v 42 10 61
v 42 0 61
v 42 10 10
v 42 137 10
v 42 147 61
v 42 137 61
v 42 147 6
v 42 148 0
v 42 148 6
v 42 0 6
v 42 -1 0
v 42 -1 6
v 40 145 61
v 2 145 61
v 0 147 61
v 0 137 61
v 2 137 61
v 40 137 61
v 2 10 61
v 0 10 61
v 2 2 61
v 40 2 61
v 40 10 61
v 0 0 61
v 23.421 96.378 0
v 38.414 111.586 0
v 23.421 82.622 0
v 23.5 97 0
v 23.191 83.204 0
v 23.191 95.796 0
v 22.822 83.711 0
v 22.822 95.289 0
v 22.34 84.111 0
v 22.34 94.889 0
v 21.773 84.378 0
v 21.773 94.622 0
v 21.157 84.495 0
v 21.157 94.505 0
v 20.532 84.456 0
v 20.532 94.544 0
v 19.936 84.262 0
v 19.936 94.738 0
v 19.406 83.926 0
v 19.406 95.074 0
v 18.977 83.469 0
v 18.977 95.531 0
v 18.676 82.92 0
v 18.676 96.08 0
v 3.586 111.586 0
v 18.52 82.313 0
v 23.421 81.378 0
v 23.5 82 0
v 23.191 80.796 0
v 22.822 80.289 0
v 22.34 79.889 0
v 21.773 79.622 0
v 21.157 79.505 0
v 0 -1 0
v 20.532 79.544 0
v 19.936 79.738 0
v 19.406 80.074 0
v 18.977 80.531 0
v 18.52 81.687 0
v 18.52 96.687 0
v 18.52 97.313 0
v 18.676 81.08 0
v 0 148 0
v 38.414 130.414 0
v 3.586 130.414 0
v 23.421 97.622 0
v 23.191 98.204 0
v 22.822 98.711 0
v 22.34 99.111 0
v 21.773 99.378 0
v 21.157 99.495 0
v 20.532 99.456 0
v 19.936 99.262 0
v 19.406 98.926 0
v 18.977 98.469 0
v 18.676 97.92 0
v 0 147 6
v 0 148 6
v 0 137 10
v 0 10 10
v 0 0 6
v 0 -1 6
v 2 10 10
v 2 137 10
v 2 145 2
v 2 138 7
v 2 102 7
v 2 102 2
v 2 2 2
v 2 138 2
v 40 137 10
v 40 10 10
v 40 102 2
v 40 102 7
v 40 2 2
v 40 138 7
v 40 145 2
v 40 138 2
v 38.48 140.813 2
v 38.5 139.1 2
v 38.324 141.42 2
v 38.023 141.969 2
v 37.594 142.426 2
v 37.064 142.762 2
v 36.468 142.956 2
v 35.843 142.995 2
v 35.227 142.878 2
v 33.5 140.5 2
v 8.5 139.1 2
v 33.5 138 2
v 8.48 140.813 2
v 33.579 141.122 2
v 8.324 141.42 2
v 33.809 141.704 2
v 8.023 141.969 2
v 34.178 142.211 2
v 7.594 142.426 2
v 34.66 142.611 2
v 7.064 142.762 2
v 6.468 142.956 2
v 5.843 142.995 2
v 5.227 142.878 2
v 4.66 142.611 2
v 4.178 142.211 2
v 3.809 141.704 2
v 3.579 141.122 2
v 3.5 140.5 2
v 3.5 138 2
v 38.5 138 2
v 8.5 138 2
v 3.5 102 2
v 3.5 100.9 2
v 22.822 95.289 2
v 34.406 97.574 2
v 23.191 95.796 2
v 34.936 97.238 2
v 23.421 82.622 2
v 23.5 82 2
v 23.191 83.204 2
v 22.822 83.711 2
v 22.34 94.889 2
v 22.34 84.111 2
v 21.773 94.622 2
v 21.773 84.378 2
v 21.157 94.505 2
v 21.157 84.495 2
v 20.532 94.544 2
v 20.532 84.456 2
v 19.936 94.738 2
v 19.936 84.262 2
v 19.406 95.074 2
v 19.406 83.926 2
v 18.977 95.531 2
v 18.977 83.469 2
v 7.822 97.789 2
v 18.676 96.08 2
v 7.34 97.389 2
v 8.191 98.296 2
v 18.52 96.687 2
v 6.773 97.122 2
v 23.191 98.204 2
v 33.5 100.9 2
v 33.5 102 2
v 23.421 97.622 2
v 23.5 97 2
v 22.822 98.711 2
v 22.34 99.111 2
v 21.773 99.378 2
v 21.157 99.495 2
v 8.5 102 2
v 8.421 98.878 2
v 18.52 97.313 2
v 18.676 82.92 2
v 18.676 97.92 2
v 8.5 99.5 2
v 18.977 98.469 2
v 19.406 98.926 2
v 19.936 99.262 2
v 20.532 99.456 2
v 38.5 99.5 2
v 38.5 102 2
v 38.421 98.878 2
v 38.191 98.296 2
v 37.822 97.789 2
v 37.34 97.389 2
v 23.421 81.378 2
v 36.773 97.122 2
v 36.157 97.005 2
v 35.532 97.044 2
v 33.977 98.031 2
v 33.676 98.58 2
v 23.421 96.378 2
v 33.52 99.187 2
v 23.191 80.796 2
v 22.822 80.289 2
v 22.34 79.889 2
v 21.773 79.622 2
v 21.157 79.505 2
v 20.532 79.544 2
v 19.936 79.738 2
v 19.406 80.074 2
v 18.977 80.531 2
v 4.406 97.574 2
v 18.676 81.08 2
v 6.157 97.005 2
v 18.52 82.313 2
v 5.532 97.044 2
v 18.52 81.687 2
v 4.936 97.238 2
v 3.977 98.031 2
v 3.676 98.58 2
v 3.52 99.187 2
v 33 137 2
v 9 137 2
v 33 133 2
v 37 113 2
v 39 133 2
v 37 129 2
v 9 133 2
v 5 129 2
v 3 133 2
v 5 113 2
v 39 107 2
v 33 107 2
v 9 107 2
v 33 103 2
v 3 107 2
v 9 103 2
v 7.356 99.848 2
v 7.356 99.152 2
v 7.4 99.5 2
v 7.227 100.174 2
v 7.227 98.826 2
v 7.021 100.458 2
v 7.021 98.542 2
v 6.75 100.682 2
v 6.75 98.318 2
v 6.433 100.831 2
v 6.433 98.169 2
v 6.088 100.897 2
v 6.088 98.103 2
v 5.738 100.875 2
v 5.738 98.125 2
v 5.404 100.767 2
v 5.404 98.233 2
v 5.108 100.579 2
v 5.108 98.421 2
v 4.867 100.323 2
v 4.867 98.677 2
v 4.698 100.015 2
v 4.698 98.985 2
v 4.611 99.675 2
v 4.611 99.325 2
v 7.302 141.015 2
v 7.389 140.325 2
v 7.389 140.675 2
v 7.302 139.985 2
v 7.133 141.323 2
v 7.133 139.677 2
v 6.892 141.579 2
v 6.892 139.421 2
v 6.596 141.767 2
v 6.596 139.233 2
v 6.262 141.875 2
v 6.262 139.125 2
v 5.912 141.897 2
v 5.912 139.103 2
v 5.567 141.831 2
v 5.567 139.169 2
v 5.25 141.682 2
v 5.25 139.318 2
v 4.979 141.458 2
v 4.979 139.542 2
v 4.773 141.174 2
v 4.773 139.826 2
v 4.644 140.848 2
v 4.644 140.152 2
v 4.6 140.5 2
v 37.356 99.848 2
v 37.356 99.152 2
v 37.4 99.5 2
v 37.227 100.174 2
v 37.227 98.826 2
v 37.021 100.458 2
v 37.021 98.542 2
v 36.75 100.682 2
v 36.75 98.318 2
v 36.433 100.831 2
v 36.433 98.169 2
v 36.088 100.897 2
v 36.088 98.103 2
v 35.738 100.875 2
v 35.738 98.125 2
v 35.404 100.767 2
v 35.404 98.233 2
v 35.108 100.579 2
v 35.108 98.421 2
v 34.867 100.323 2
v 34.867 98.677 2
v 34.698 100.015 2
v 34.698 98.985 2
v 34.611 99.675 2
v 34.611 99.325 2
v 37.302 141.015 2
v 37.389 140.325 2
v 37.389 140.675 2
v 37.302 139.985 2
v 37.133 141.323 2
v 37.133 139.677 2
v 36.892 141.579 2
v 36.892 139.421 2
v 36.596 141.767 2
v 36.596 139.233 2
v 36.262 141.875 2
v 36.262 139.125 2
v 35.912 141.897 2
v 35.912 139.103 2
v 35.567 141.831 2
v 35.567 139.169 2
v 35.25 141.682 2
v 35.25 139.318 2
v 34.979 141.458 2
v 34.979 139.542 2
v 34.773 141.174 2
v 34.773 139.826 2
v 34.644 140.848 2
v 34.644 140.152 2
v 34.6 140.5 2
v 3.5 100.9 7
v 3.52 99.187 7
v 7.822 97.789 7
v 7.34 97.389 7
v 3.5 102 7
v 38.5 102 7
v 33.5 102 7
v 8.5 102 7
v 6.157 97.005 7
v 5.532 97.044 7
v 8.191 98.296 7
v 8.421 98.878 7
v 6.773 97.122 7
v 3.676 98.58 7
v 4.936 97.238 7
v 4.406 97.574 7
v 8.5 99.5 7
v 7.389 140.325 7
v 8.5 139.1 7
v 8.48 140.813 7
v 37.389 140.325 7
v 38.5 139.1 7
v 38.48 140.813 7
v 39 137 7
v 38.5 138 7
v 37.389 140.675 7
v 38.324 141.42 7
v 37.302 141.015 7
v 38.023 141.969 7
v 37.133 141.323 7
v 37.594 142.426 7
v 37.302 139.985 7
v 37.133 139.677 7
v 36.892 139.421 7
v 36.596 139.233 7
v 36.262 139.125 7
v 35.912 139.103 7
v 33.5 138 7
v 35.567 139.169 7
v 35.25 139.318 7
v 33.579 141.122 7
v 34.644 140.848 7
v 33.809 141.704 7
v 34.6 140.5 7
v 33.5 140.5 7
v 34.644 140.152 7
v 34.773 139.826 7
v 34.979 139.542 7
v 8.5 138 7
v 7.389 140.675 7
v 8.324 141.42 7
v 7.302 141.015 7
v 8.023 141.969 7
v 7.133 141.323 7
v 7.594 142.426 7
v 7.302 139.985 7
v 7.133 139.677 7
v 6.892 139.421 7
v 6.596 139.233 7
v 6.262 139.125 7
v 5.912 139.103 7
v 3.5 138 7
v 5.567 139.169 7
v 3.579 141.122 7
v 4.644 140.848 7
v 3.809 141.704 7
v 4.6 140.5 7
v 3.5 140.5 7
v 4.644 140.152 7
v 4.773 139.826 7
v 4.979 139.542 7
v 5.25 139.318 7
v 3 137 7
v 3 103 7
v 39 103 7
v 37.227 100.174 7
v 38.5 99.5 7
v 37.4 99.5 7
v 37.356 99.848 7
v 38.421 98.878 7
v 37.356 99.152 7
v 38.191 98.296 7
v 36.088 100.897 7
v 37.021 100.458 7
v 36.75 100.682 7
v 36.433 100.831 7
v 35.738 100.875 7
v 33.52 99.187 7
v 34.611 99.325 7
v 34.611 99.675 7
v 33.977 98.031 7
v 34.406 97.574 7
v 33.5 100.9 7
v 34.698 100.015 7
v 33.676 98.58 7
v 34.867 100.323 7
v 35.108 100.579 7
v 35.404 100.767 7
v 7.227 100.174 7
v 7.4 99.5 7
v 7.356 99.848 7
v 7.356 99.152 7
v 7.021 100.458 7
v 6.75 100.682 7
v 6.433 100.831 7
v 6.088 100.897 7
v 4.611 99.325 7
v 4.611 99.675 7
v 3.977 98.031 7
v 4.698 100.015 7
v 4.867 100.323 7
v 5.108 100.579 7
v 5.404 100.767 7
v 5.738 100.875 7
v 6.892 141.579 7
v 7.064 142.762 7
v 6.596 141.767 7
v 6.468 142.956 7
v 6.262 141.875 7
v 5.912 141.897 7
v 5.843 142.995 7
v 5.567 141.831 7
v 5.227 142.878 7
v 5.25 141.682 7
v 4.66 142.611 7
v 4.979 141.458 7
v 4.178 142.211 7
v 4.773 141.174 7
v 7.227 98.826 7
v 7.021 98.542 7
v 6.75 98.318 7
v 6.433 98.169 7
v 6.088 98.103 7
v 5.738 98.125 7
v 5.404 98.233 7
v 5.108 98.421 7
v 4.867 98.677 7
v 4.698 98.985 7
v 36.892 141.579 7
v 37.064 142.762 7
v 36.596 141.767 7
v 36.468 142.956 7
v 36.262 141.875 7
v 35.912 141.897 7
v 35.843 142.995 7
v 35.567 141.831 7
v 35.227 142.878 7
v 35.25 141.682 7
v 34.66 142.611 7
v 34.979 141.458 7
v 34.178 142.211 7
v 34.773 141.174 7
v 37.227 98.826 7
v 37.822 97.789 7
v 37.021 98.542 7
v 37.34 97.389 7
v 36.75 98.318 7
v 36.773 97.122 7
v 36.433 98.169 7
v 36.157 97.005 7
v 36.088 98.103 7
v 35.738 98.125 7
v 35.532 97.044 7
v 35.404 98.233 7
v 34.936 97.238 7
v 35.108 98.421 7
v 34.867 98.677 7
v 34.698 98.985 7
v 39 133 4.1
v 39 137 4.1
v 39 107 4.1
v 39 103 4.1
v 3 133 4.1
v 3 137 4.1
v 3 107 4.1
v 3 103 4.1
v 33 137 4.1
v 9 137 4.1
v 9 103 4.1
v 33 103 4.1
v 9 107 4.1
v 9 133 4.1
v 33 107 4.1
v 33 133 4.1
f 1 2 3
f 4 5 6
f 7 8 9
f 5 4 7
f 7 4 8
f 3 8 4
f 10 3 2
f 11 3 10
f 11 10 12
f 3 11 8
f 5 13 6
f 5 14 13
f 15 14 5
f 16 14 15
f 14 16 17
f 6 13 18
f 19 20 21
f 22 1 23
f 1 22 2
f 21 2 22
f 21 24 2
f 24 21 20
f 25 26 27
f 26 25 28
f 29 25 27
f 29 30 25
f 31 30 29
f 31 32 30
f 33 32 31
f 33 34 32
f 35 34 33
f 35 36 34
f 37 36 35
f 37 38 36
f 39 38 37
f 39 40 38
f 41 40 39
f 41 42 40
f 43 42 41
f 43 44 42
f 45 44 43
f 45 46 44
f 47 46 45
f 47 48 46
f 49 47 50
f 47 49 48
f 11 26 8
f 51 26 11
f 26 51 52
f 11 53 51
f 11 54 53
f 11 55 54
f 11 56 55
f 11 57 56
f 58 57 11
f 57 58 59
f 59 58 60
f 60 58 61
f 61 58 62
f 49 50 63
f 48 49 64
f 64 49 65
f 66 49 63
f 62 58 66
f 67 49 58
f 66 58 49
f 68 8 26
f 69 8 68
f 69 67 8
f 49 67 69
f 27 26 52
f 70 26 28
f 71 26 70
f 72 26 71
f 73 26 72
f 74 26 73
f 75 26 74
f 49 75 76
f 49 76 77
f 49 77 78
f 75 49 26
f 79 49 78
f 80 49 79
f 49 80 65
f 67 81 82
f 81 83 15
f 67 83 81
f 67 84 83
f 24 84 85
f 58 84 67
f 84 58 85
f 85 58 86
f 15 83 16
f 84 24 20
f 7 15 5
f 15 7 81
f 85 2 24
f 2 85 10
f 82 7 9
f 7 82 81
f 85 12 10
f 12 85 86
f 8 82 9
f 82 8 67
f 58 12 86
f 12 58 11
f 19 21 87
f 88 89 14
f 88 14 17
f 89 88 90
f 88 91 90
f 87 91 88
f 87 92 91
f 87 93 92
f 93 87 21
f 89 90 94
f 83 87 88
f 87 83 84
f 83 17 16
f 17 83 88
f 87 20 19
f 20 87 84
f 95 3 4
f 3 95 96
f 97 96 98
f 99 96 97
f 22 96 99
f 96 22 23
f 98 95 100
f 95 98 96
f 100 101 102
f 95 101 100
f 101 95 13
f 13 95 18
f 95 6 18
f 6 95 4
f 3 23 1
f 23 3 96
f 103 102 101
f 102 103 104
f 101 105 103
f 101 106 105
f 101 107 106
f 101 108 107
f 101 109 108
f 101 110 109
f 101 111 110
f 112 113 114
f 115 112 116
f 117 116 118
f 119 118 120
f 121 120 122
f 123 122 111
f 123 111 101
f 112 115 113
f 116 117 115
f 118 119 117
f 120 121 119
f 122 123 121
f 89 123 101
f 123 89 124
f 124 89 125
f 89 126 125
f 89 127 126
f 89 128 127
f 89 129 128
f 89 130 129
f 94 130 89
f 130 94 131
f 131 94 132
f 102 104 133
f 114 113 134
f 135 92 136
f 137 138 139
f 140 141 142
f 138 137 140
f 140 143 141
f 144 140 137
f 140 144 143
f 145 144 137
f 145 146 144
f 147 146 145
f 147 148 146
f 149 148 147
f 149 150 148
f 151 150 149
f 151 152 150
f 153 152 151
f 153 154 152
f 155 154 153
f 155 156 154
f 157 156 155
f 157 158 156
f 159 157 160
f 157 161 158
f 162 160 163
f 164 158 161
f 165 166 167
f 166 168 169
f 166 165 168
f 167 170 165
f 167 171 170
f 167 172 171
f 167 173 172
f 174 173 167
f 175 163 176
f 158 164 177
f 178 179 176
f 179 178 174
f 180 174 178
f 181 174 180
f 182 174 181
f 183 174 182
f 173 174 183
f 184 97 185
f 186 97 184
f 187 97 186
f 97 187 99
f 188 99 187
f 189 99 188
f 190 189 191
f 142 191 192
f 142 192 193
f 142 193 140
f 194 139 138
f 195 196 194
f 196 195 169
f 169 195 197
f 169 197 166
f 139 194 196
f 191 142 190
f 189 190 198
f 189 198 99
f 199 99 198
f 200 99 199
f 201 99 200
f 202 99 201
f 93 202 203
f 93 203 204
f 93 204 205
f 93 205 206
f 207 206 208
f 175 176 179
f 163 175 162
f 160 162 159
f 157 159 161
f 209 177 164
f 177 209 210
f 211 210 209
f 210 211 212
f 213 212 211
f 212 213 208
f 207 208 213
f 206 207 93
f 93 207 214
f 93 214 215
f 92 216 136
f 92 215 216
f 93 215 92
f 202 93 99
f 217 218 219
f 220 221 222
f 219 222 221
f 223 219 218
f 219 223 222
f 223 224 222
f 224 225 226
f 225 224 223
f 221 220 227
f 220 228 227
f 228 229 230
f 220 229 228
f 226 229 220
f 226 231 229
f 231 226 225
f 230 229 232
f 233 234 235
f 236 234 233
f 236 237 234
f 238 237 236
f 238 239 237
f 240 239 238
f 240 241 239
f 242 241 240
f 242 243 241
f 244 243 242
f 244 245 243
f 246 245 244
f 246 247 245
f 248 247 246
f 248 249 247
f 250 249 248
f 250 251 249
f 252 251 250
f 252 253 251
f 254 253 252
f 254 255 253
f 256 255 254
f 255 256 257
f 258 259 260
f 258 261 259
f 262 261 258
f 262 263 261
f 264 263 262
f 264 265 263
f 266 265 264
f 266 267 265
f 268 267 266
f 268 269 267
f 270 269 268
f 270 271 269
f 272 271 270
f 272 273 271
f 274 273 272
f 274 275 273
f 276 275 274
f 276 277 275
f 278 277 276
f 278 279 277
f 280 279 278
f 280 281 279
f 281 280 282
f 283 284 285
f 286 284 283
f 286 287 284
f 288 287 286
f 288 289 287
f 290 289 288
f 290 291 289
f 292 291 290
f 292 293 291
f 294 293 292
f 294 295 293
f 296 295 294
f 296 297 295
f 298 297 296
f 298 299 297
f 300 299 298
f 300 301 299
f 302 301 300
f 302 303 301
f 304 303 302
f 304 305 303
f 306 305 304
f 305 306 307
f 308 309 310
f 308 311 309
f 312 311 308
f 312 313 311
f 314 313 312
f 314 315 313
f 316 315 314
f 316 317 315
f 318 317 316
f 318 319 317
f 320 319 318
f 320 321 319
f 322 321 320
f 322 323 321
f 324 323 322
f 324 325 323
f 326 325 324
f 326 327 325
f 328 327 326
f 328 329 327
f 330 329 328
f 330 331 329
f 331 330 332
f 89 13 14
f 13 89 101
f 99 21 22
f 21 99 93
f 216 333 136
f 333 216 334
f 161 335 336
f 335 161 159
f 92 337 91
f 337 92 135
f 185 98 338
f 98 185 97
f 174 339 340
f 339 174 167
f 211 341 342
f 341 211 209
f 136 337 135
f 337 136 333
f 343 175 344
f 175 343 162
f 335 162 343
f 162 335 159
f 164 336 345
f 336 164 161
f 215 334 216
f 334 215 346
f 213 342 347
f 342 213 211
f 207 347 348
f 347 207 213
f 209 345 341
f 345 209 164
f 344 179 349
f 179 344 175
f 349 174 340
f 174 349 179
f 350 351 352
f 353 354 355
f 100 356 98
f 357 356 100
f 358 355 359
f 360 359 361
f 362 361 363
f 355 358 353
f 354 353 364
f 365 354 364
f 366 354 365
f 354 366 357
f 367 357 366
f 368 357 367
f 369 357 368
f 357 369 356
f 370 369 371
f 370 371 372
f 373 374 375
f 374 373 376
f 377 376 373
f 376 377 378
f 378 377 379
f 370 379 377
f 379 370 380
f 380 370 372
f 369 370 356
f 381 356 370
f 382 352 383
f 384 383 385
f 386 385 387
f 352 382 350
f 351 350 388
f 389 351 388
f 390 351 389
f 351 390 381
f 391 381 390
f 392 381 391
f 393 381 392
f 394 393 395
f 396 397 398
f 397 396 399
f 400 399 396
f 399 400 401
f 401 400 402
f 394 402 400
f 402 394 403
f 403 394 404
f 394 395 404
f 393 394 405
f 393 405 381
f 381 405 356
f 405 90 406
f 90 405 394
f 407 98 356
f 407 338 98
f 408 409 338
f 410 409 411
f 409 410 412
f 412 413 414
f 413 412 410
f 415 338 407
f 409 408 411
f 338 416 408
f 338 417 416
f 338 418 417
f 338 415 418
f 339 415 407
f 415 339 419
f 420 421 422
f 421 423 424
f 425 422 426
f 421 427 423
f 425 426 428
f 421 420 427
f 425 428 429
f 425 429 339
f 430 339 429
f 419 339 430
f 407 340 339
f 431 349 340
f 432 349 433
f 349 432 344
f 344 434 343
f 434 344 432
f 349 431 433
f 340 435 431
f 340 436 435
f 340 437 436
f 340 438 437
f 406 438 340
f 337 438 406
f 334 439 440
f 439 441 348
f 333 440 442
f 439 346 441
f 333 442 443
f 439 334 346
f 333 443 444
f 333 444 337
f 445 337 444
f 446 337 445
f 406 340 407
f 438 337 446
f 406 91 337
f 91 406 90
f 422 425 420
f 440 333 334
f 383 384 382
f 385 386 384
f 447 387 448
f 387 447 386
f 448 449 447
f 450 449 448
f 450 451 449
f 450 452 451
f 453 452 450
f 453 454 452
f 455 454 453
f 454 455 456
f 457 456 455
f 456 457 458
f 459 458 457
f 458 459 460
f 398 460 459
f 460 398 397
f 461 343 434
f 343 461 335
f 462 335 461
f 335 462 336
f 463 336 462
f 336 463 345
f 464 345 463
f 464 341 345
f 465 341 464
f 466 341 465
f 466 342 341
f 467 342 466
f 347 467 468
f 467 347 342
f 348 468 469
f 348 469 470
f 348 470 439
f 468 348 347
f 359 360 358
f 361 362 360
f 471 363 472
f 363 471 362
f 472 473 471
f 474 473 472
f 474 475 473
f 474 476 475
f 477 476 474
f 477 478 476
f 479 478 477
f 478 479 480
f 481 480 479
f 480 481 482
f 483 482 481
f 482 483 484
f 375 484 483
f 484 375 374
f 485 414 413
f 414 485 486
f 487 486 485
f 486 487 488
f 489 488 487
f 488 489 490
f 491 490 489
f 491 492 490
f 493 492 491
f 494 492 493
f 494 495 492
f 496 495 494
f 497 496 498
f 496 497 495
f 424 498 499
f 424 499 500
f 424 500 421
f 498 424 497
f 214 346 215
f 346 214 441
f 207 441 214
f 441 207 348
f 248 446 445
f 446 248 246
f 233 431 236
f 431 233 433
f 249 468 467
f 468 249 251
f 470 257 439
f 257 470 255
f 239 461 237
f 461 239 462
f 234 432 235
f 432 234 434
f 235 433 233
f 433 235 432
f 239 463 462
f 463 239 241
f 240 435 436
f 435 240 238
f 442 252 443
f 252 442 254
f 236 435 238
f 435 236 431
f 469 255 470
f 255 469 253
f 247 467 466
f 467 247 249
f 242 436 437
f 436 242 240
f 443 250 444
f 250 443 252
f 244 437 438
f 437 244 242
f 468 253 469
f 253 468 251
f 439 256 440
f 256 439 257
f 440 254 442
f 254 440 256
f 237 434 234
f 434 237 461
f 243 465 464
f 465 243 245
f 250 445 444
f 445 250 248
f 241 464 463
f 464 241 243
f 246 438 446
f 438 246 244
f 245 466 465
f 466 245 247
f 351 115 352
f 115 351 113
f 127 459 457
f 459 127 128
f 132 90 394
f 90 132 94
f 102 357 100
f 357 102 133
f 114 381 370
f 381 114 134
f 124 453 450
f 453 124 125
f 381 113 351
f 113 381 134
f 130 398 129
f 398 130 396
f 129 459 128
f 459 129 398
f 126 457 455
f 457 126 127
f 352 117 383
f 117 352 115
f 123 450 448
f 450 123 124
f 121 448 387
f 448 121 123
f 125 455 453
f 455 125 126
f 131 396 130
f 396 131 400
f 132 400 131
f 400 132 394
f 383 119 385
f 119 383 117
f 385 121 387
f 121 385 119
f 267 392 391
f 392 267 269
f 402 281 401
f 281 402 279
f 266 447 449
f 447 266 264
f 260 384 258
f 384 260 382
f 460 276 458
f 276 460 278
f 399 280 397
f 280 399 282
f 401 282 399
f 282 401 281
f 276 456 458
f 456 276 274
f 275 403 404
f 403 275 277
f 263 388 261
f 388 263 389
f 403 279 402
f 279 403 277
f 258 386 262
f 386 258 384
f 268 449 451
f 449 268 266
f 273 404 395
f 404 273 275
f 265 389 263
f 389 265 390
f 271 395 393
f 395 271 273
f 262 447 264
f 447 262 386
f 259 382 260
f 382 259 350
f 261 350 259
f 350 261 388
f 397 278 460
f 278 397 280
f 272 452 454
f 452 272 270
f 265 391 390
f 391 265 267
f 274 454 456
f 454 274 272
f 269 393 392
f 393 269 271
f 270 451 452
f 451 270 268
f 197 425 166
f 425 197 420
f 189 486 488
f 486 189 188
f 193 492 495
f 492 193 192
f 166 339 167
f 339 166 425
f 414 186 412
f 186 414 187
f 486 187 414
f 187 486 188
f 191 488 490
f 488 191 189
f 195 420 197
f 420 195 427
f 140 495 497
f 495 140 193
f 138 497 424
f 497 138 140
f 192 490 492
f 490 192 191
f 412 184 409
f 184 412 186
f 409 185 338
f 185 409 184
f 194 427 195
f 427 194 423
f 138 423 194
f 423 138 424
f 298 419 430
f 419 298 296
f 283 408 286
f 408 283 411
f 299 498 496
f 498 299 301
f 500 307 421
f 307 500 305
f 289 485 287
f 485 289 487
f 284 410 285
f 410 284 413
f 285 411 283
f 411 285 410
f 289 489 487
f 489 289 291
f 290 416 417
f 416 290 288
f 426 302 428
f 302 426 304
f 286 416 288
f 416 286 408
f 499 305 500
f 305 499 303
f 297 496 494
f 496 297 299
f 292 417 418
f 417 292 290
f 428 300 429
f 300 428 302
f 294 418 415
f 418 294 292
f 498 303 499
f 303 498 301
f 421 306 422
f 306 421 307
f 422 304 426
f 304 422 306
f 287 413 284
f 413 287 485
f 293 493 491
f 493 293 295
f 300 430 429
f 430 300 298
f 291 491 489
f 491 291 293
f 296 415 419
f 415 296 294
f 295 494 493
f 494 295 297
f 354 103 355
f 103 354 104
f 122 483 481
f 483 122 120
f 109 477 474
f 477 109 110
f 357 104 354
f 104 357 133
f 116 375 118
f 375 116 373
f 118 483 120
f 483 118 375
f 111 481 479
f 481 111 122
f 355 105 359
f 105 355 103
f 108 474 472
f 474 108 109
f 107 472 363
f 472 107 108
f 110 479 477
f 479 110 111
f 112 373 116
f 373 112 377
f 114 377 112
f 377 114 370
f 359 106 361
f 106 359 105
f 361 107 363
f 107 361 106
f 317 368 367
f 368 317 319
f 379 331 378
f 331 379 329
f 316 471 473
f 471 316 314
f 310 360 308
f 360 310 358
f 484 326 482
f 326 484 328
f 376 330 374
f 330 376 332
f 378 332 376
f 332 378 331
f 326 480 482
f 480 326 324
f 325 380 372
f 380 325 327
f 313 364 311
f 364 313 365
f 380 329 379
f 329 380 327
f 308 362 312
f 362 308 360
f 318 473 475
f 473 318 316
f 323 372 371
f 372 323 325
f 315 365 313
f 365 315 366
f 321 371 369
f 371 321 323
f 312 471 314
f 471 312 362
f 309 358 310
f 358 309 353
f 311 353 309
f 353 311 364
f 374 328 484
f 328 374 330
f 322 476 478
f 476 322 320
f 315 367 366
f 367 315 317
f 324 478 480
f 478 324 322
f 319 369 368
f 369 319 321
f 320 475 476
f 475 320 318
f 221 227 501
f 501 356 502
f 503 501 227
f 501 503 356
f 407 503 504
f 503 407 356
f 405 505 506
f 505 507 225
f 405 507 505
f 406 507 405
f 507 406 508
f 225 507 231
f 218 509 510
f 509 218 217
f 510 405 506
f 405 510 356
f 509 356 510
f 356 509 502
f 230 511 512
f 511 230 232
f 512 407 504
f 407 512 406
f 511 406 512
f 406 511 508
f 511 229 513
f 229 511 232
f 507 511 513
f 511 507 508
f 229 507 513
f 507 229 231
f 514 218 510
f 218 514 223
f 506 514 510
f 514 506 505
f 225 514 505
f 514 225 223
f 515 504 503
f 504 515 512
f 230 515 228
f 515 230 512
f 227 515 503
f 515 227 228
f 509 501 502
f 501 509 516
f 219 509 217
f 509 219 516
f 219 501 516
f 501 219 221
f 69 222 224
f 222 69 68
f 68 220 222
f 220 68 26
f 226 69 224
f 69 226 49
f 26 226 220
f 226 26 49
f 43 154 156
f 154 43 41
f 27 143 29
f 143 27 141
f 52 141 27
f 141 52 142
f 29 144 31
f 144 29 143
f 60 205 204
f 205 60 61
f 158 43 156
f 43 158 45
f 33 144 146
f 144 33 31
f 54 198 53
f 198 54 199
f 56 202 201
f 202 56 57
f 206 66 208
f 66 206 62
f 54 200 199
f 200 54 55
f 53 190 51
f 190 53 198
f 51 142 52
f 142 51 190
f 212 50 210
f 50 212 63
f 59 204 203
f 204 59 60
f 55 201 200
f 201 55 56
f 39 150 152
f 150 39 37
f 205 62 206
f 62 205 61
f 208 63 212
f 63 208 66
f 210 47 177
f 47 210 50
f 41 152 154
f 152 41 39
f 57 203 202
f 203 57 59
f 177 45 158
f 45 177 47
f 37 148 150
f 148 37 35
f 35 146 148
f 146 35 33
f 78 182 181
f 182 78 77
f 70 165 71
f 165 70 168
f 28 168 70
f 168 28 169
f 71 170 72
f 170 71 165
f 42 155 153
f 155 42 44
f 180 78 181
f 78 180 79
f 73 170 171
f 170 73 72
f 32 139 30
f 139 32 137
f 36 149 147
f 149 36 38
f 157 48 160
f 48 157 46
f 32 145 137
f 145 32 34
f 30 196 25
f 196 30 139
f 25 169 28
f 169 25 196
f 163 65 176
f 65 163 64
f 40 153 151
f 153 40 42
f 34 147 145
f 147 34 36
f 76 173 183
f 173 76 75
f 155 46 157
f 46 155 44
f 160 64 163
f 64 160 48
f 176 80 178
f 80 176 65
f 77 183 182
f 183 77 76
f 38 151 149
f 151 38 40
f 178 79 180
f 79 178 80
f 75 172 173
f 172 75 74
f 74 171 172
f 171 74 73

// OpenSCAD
// file: lib/traymount.scad
use <./shapes.scad>

module traymount(width, height, front_thickness, thickness, positive, ds=2.3) {

    tray_screw_mount_spacing = 10;
    tray_screw_mount_height = 5;
    tray_screw_mount_diameter = 8;

    // Allow tray components to get closer to the front by making an indentation
    indent_rim = 4;
    indent_width = width - (2*indent_rim);
    indent_height = height - (2*indent_rim);
    indent_depth = 2;
    indent_x = indent_rim;
    indent_y = indent_rim;

    botton_hole_offset = 15;
    botton_hole_spacing = 7;
    usb_hole_width = 7;
    usb_hole_height = 15;

    module __build() {

        // rbd = max(rotary_box_depth, thickness-rotary_thread_height);

        difference() {
            union() {
                // Make sure we using the front plate (allow cut cutting in it)
                cube([width, height, front_thickness]);
            }
            union() {
                // Provide an additional 1mm for stuff in the tray
                translate([indent_x, indent_y, front_thickness-indent_depth])
                    cube([indent_width, indent_height, indent_depth]);

                //
                for (hole=[0,1]) {
                    translate([width/2, botton_hole_offset + (hole * botton_hole_spacing)])
                        cylinder(r=3.5 / 2, h=front_thickness);
                }

                // USB
                translate([(width - usb_hole_width)/2, botton_hole_offset + (2 * botton_hole_spacing)])
                    cube([usb_hole_width, usb_hole_height, front_thickness]);

            }
        }

    }

    if (positive == true) {
        translate([0,0,-front_thickness])
            __build();
    } else {
        translate([0,0,0])
            difference() {
                hull() __build();
                __build();
            }
    }
}
// file: lib/shapes.scad
module flat_pyramid(size, angle=45) {  
    p = size.z * sin(angle);
    hull() {
        cube(size);
        translate([-p, -p, -size.z])
            cube([size.x+(2*p), size.y+(2*p), size.z]);
    }   
}

module screw_mount(h, dm, ds=2.3) {
    difference() {
        cylinder(h=h, r=dm/2);
        screw_hole(h=h, d=ds);
    }
}

module screw_mount_flatside(h, dm, ds=2.3) {
    difference() {
        hull() {
        cylinder(h=h, r=dm/2);
        translate([-(dm/2), ds/2, 0])
            cube([dm, (dm-ds)/2, h]);

        }
        screw_hole(h=h, d=ds);       
    }
}

module screw_hole(h=0, d=2.3) {
    cylinder(h=h, r=d/2);       
}

module quad_mount(x, y, h=0, dm=5, ds=2.3) {
    translate([0,0])
        screw_mount(h, dm, ds);
    translate([x,0])
        screw_mount(h, dm, ds);
    translate([0,y])
        screw_mount(h, dm, ds);
    translate([x,y])
        screw_mount(h, dm, ds);
}

module sunken_screw_hole(h, d=3, dh=6, hh=2) {
    // Hole straight through
    cylinder(r=d/2,h=h);
    // Edged hole:
    hull() {
        cylinder(r=dh/2,h=0.1);
        translate([0,0,hh]) cylinder(r=d/2,h=0.1);
    }
}
// file: lib/pushbutton.scad
module pushbutton_cutout(d0=5, d1=8, h0=2, h1=4) {
    cylinder(h=h0, r=(d0/2));

    translate([0,0,h0])
        cylinder(h=h1, r=(d1/2));
}
// file: lib/oled128x64-13.scad
use <shapes.scad>

inside = [
    36, 
    34,
    5
];
screw_mount_d = 5;

module __oled_128x64_13_mounts(size, t=1, d=3) {
    // Screw mounts
    for (x=[0,1])
    for (y=[0,1])           
    translate([
        (x * size.x) - (((x-0.5)*2) * 4),
        (y * size.y) + (((y-0.5)*2) * (screw_mount_d/2)),
    ])
    rotate( y*180 )
    screw_mount_flatside(h=size.z, dm = 5, ds=d);

    cube(size);
}

module __oled_128x64_13_pads(t) {
    pad = [6, 4, t];
    for (x=[0,1])
    for (y=[0,1])           
    translate([
        (x * inside.x) - (x * pad.x),
        (y * inside.y) - (y * pad.y),
    ])
    cube(pad);
}

module oled_128x64_13(positive, t=1, tfront=2, dh=3, ds=2.8, center=true) {

    outside = [
        inside.x + (2*t),
        inside.y + (2*t),
        inside.z
    ];

    view = [
        32,
        16,
        tfront
    ];
    view_offset_y = 10.0;

    // Relative to inside
    view_pos = [(inside.x-view.x)/2, view_offset_y];
    
    translate(center==true ? [-outside.x/2, -outside.y/2] : [0,0]) {

        // This is the "drop-in-hole" for the OLED display,
       
        if (positive==true) {

            difference() {
                __oled_128x64_13_mounts(outside, t=t, d=ds);
                translate([t,t])
                    cube(inside);
            }

            translate([t,t])
                __oled_128x64_13_pads(2.1);
        } else {
            translate([t,t,-tfront]) {
                translate(view_pos)
                flat_pyramid(view);
            }
        }
    }
}

module oled_128x64_13_support(positive, t=1, tlid=2, dh=3, dh=3.1) {

    lid = [
        inside.x + (2*t),
        inside.y + (2*t),
        tlid
    ];

    difference() {
        union() {
            cube(lid);

            // Screw mounts
            __oled_128x64_13_mounts(lid, t=t, d=dh);

            translate([t,t,lid.z])
                __oled_128x64_13_pads(1.8);
        }
        union() {
            pins = [12,6, lid.z];
            translate([(lid.x-pins.x)/2,0])
                cube(pins);

            hole = [26,20,lid.z];
            translate([(lid.x-hole.x)/2, (lid.x-hole.y)/2])
                cube(hole);

        }
    }
}
// file: lib/rotaryencoder.scad
module __rotaryencoder(thickness, type, ht=6, positive) {

    rotary_bottom_width = 20;
    rotary_bottom_height = 15;

    rotary_box_width = 12.2;
    rotary_box_height = 12.2;
    rotary_box_depth = 1;
    rotary_box_thickness = 1;

    rotary_thread_diameter = 7.0;
    rotary_thread_height = ht;

    // rotary_nut_diameter = 12;
    // rotary_nut_height = 2.5;

    rotary_nudge_diameter = 2.5;
    rotary_nudge_distance = 6.0;
    rotary_nudge_depth = 1.45;

    // Tiny ridge on top of the rotary encoder housing, before the thread starts
    rotary_ridge_diameter = 8.5;
    rotary_ridge_height = 0.5;

    mount_diameter = rotary_thread_diameter * 2;

    module __build(thickness) {

        rbd = max(rotary_box_depth, thickness-rotary_thread_height);

        difference() {
            union() {
                translate([
                    -(rotary_box_width/2)-(rotary_box_thickness),
                    -(rotary_box_height/2)-(rotary_box_thickness)
                ])
                    cube([
                        rotary_box_width+(2*rotary_box_thickness),
                        rotary_box_height+(2*rotary_box_thickness),
                        rotary_thread_height + rbd
                    ]);
            }
            union() {
                cylinder(h=rotary_thread_height, r=rotary_thread_diameter/2);

                // cylinder(h=rotary_nut_height, r=rotary_nut_diameter/2);

                translate([0,0, rotary_thread_height-rotary_ridge_height])
                    cylinder(h=rotary_ridge_height, r=rotary_ridge_diameter/2);

                translate([
                    -(rotary_box_width/2),
                    -(rotary_box_height/2),
                    rotary_thread_height
                ])
                    cube([
                        rotary_box_width,
                        rotary_box_height,
                        rotary_thread_height + rbd,
                    ]);

            }
        }

    }

    // module rotaryhole() {
    //     // Primary hole
    //     cylinder(h=front_thickness, r=(rotary_diameter/2));

    //     // Screw/washer hole
    //     cylinder(h=(front_thickness-rotary_height), r=(rotary_screw_diameter/2));

    //     // Ridge thing
    //     translate([0, 0, front_thickness - rotary_ridge_depth])
    //         cylinder(h=rotary_ridge_depth, r=rotary_ridge_diameter/2);

    //     // The nudge/tip:
    //     translate([-rotary_tip_distance, 0, front_thickness - rotary_tip_depth])
    //         cylinder(h=rotary_tip_depth, r=rotary_tip_diameter/2);
    // }

    if (positive == true) {

        translate([0,0,-thickness])
            __build(thickness);

        // mount_height = rotary_thread_height - thickness;
        // if (mount_height > 0) {
        //     difference() {
        //         cylinder(h=mount_height, r=(mount_diameter/2));
        //         union() {
        //             cylinder(h=mount_height, r=(rotary_thread_diameter/2));
        //             cylinder(h=mount_height-ridge, r=(rotary_ridge_diameter/2));
        //         }
        //     }   
        // }

        // if (type == "nudge") {
        //     // cylinder(h=thickness, r=(rotary_thread_diameter/2));
        // } else if (type == "boxed") {
        //     translate([-rotary_bottom_width/2, -rotary_bottom_height/2,-5])
        //         cube([rotary_bottom_width, rotary_bottom_height, thickness]);
        // }

    } else {

        translate([0,0,0])
            difference() {
                hull() __build(thickness);
                __build(thickness);
            }
           
        // if (type == "nudge") {
        //     cylinder(h=thickness, r=(rotary_mount_diameter/2));
        // } else if (type == "boxed") {

        //      cylinder(h=max(rotary_thread_diameter, thickness), r=(rotary_thread_diameter/2));
        //      cylinder(h=max(rotary_nut_height, thickness), r=(rotary_nut_diameter/2));

        //     delta = thickness - rotary_thread_height;
        //     if (delta > 0) {

        //     }

        //     // translate([-rotary_bottom_width/2, -rotary_bottom_height/2])
        //     //     cube([rotary_bottom_width, rotary_bottom_height, thickness]);
        // }


        // translate([0,0,thickness - rotary_nut_height])
        //     cylinder(h=rotary_nut_height, r=(rotary_thread_diameter/2));

    }

}

module rotaryencoder_boxed(thickness, ht, positive) {
    __rotaryencoder(thickness, "boxed", ht, positive);
}

module rotaryencoder_nudge(thickness, ht, positive) {
    __rotaryencoder(thickness, "nudge", ht, positive);
}
// main file
// MT32-Pi controls for 3.5" bay
// By Hans Christian Saustrup <hc@saustrup.net>
model_version = "v0.0.1";

use <lib/rotaryencoder.scad>
use <lib/oled128x64-13.scad>
use <lib/pushbutton.scad>
use <lib/shapes.scad>
use <lib/traymount.scad>

$fn = $preview ? 0 : 25; 

test = false;

// Unit size
unit_size = [
    42,
    147,
    61 
];

// Front plate size (width, height, depth)
unit_front_size = [42, 149, 6];

// Minimum width of unit walls (behind front plate)
unit_brim = 10;

// Holes for mounting
unit_screws = [
    [47, 10],
    [47, 20]
];

// General plate thickness
unit_t = 2;

// Screw hole diameter
screw_hole_d = 3;

// Screw threaded hole diameter
screw_thread_d = 2.5;

// Position of the OLED display
display_y = 118;

// Position of the rotary encoder
rotary_y = 95;

// Position of the LED
led_y = 80;

// Slot(s)
dualmode = false;
slots = [dualmode ? [0, 20] : [11], 60];

__build();

module __build() {

    __unit_inside_size = [
        unit_size.x - (2*unit_t),
        unit_size.y - (2*unit_t),
        unit_size.z - (1*unit_t)
    ];

    echo("Inside dimensions: ", __unit_inside_size);

    // usb = [7,15];
    // button_d = 3.5;
    // b1_y = 5;
    // b2_y = b1_y + 7.25;
    // b3_y = b2_y + 9.00;
    // b_x = 10;

    // for (x = slots.x) {
    //     x2 = (x - unit_t) + b_x;

    //     for (s = [b1_y, b2_y]) {
    //         translate([x2, 40 + s, -unit_t])
    //             cylinder(r=button_d/2, h=unit_t);
    //     }

    //     translate([x2 - (usb.x/2) , b3_y, -unit_t])
    //         cube([usb.x, usb.y, unit_t]);

    //     // translate([x, slots.y - unit_brim + unit_t, 0]) cube([unit_t, unit_brim - unit_t, __unit_inside_size.z]);
    // }

    module led(positive) {
        if (positive) {
        } else {
            translate([0,0,-unit_t])
               cylinder(r=2.5, h=unit_t);
        }
    }

    module display(positive) {
        oled_128x64_13(positive, tfront=unit_t);
    }

    module rotary(positive) {
        if (positive) {
        } else {
            translate([0,0,-unit_t])
                cylinder(r=2.5, h=unit_t);
        }
    }

    module components(positive=true) {

        center_x    = __unit_inside_size.x/2;
        // slots       = [0, __unit_inside_size.y - slots.y];
        led         = [center_x, led_y];
        rotary      = [center_x, rotary_y];
        display     = [center_x, display_y];

        // translate(slots)    slots(positive);
        translate(display)  display(positive);
        translate(led)      led(positive);
        translate(rotary)   rotary(positive);
    }

    difference() {
        union() {
            difference() {
                union() {
                    // Positive

                    // The unit
                    cube(unit_size);

                    // The unit front plate (decoration)
                    translate([
                        (unit_size.x-unit_front_size.x)/2,
                        (unit_size.y-unit_front_size.y)/2,
                    ]) cube(unit_front_size);

                }
                union() {
                    // Remove sides - leave a brim
                    for (side=[0,1]) {
                        translate([side * (unit_size.x-unit_t), unit_brim, unit_brim])
                            cube([
                                unit_t,
                                unit_size.y - (unit_brim*2),
                                unit_size.z - unit_brim
                            ]);
                    }

                    // Go inside unit
                    translate([unit_t, unit_t, unit_t]) {
                        // Hollow out unit
                        cube(__unit_inside_size);
                    }
                }
            }

            translate([unit_t, unit_t, unit_t]) {
                components(true);
            }
        }
        union() {
            translate([unit_t, unit_t, unit_t]) {
                components(false);
            }
        }
    }
}

echo("---");
